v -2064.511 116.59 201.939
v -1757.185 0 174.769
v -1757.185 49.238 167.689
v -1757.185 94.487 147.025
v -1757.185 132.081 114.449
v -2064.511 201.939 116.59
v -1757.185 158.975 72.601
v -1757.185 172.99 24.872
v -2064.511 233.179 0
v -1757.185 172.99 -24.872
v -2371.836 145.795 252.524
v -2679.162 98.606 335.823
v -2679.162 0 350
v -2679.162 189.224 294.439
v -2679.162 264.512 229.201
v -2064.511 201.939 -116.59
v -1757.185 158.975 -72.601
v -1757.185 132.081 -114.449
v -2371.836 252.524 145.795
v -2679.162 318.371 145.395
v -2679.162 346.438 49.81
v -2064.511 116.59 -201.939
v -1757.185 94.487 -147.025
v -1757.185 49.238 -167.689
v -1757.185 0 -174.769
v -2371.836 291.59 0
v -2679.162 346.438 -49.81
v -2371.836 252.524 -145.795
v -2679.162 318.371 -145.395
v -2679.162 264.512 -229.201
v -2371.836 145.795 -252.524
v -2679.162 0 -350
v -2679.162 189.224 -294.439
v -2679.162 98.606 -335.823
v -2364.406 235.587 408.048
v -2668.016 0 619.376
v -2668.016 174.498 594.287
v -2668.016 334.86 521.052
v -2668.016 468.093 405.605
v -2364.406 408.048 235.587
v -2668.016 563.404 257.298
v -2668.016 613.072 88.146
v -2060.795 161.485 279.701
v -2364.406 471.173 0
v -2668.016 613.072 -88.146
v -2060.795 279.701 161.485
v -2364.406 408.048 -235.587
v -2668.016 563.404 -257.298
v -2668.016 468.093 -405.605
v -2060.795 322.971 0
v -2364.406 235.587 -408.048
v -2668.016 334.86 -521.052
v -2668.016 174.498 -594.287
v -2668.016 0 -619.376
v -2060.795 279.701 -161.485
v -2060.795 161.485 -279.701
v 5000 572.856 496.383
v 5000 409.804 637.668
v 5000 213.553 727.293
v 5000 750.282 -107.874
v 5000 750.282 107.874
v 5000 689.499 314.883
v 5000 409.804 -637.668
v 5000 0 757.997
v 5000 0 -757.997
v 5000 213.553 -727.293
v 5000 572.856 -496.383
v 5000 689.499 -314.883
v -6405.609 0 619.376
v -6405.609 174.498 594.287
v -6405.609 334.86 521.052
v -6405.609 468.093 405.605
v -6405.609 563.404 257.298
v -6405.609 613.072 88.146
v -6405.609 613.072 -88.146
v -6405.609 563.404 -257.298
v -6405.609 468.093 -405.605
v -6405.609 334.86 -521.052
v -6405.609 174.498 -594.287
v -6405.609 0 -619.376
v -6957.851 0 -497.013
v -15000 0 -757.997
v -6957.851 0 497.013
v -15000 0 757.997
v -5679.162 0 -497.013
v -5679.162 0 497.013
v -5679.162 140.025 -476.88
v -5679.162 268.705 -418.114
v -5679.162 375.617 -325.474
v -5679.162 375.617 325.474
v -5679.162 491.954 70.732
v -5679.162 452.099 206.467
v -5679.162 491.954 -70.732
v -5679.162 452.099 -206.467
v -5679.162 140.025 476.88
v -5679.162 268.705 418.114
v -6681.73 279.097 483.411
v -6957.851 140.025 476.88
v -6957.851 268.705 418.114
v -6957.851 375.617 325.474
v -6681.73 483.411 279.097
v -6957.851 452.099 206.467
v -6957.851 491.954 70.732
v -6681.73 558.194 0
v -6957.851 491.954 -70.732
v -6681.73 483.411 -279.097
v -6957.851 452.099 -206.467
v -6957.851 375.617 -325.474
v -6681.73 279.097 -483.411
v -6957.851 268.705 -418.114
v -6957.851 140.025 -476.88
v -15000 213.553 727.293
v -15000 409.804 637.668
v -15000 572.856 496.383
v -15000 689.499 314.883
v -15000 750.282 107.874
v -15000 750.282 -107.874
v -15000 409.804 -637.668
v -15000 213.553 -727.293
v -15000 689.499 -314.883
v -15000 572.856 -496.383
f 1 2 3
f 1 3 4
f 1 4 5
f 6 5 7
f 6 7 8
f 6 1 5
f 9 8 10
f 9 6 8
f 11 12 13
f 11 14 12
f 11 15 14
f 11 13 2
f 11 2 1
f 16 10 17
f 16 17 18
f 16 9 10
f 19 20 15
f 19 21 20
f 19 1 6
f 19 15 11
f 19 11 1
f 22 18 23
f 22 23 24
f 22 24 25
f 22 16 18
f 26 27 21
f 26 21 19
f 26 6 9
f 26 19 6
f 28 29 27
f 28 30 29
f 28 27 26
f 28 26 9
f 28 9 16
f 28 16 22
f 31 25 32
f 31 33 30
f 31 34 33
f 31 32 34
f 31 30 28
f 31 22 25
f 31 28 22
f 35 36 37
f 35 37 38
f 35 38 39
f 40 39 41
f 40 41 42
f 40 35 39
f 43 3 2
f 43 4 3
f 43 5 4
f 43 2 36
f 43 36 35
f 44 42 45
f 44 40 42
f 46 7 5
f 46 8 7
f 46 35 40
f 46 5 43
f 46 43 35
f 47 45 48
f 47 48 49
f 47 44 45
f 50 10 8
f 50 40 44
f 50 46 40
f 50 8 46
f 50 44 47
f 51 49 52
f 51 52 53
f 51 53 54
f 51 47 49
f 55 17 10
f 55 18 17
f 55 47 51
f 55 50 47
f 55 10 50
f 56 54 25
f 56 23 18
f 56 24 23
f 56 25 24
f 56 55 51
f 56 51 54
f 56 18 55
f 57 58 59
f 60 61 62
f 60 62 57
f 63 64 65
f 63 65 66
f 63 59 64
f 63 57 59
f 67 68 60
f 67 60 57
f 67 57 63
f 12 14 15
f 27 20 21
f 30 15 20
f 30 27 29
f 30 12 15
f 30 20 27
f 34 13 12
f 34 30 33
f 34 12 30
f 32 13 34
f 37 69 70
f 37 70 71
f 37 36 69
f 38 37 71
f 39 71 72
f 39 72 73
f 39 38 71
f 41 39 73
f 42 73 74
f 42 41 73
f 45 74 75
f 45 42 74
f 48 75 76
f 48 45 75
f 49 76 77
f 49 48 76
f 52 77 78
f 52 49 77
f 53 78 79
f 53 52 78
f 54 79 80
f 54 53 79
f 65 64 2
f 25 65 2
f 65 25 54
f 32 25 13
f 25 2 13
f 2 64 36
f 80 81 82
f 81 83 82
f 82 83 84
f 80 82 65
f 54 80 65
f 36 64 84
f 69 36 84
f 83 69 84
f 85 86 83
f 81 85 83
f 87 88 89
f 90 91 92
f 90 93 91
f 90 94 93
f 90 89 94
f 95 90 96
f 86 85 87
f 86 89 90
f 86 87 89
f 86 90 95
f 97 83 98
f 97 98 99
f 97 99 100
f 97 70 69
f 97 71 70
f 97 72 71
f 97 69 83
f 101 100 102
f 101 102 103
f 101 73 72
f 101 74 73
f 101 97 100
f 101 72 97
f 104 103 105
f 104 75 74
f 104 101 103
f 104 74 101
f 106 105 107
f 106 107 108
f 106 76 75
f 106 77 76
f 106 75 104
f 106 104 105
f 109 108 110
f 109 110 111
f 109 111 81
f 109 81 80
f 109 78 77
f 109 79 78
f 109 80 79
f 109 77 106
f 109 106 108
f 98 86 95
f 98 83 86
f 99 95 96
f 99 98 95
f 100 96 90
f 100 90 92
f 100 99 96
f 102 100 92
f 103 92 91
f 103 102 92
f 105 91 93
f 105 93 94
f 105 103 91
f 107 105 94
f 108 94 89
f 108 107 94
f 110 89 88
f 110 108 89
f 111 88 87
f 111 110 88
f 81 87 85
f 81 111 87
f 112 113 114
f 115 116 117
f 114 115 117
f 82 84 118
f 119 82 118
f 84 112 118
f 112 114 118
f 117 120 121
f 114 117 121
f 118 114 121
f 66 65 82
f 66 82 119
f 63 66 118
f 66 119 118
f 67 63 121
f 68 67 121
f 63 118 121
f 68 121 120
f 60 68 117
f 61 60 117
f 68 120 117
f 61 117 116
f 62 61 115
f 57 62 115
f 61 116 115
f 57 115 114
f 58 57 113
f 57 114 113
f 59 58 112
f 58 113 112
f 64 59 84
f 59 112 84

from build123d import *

# Parameters (mm, degrees)
BOSS_EXTRUDE1_DEPTH      = 5000
BOSS_EXTRUDE1_DEPTH_BACK = 15000
SKETCH2_R                = 757.99738402
SKETCH3_W                = 22982.636608486
SKETCH3_H                = 3639.943339499
CUT_EXTRUDE1_DEPTH       = 15039.255220216


with BuildPart() as part:
    # Sketch1 → Revolve1 (revolve)
    with BuildSketch(Plane(origin=(0, 0, 0), x_dir=(-1, 0, 0), z_dir=(0, 1, 0)), mode=Mode.PRIVATE) as revolve1_sk:
        Polygon((2668.016049341, 619.375942877), (1757.185045246, 174.768523987), (2679.161981208, 350), (2679.161981208, 0), (5679.161981208, 0), (5679.161981208, 497.012889954), (6957.851062661, 497.012889954), (6405.608884025, 619.375942877), align=None)
    revolve(revolve1_sk.sketch.rotate(Axis((-2679.161981208, 0, 0), (-1, 0, 0)), 180), axis=Axis((-2679.161981208, 0, 0), (-1, 0, 0)))


with BuildPart() as body_2:
    # Sketch2 → Boss-Extrude1 (new, two sides: drawn at the far end of the back side and taken through both)
    with BuildSketch(Plane(origin=(0, 0, 0), x_dir=(0, 0, -1), z_dir=(1, 0, 0)).offset(-BOSS_EXTRUDE1_DEPTH_BACK)):
        Circle(SKETCH2_R)
    extrude(amount=BOSS_EXTRUDE1_DEPTH + BOSS_EXTRUDE1_DEPTH_BACK)

    # Combine1: cut part
    add(part.part, mode=Mode.SUBTRACT)

    # Sketch3 → Cut-Extrude1 (cut, through all)
    with BuildSketch(Plane(origin=(0, 0, 0), x_dir=(-1, 0, 0), z_dir=(0, 1, 0))):
        with Locations((5164.892884317, 260.380744392)):
            Rectangle(SKETCH3_W, SKETCH3_H)
    extrude(amount=-CUT_EXTRUDE1_DEPTH, mode=Mode.SUBTRACT)


solid = body_2.part
